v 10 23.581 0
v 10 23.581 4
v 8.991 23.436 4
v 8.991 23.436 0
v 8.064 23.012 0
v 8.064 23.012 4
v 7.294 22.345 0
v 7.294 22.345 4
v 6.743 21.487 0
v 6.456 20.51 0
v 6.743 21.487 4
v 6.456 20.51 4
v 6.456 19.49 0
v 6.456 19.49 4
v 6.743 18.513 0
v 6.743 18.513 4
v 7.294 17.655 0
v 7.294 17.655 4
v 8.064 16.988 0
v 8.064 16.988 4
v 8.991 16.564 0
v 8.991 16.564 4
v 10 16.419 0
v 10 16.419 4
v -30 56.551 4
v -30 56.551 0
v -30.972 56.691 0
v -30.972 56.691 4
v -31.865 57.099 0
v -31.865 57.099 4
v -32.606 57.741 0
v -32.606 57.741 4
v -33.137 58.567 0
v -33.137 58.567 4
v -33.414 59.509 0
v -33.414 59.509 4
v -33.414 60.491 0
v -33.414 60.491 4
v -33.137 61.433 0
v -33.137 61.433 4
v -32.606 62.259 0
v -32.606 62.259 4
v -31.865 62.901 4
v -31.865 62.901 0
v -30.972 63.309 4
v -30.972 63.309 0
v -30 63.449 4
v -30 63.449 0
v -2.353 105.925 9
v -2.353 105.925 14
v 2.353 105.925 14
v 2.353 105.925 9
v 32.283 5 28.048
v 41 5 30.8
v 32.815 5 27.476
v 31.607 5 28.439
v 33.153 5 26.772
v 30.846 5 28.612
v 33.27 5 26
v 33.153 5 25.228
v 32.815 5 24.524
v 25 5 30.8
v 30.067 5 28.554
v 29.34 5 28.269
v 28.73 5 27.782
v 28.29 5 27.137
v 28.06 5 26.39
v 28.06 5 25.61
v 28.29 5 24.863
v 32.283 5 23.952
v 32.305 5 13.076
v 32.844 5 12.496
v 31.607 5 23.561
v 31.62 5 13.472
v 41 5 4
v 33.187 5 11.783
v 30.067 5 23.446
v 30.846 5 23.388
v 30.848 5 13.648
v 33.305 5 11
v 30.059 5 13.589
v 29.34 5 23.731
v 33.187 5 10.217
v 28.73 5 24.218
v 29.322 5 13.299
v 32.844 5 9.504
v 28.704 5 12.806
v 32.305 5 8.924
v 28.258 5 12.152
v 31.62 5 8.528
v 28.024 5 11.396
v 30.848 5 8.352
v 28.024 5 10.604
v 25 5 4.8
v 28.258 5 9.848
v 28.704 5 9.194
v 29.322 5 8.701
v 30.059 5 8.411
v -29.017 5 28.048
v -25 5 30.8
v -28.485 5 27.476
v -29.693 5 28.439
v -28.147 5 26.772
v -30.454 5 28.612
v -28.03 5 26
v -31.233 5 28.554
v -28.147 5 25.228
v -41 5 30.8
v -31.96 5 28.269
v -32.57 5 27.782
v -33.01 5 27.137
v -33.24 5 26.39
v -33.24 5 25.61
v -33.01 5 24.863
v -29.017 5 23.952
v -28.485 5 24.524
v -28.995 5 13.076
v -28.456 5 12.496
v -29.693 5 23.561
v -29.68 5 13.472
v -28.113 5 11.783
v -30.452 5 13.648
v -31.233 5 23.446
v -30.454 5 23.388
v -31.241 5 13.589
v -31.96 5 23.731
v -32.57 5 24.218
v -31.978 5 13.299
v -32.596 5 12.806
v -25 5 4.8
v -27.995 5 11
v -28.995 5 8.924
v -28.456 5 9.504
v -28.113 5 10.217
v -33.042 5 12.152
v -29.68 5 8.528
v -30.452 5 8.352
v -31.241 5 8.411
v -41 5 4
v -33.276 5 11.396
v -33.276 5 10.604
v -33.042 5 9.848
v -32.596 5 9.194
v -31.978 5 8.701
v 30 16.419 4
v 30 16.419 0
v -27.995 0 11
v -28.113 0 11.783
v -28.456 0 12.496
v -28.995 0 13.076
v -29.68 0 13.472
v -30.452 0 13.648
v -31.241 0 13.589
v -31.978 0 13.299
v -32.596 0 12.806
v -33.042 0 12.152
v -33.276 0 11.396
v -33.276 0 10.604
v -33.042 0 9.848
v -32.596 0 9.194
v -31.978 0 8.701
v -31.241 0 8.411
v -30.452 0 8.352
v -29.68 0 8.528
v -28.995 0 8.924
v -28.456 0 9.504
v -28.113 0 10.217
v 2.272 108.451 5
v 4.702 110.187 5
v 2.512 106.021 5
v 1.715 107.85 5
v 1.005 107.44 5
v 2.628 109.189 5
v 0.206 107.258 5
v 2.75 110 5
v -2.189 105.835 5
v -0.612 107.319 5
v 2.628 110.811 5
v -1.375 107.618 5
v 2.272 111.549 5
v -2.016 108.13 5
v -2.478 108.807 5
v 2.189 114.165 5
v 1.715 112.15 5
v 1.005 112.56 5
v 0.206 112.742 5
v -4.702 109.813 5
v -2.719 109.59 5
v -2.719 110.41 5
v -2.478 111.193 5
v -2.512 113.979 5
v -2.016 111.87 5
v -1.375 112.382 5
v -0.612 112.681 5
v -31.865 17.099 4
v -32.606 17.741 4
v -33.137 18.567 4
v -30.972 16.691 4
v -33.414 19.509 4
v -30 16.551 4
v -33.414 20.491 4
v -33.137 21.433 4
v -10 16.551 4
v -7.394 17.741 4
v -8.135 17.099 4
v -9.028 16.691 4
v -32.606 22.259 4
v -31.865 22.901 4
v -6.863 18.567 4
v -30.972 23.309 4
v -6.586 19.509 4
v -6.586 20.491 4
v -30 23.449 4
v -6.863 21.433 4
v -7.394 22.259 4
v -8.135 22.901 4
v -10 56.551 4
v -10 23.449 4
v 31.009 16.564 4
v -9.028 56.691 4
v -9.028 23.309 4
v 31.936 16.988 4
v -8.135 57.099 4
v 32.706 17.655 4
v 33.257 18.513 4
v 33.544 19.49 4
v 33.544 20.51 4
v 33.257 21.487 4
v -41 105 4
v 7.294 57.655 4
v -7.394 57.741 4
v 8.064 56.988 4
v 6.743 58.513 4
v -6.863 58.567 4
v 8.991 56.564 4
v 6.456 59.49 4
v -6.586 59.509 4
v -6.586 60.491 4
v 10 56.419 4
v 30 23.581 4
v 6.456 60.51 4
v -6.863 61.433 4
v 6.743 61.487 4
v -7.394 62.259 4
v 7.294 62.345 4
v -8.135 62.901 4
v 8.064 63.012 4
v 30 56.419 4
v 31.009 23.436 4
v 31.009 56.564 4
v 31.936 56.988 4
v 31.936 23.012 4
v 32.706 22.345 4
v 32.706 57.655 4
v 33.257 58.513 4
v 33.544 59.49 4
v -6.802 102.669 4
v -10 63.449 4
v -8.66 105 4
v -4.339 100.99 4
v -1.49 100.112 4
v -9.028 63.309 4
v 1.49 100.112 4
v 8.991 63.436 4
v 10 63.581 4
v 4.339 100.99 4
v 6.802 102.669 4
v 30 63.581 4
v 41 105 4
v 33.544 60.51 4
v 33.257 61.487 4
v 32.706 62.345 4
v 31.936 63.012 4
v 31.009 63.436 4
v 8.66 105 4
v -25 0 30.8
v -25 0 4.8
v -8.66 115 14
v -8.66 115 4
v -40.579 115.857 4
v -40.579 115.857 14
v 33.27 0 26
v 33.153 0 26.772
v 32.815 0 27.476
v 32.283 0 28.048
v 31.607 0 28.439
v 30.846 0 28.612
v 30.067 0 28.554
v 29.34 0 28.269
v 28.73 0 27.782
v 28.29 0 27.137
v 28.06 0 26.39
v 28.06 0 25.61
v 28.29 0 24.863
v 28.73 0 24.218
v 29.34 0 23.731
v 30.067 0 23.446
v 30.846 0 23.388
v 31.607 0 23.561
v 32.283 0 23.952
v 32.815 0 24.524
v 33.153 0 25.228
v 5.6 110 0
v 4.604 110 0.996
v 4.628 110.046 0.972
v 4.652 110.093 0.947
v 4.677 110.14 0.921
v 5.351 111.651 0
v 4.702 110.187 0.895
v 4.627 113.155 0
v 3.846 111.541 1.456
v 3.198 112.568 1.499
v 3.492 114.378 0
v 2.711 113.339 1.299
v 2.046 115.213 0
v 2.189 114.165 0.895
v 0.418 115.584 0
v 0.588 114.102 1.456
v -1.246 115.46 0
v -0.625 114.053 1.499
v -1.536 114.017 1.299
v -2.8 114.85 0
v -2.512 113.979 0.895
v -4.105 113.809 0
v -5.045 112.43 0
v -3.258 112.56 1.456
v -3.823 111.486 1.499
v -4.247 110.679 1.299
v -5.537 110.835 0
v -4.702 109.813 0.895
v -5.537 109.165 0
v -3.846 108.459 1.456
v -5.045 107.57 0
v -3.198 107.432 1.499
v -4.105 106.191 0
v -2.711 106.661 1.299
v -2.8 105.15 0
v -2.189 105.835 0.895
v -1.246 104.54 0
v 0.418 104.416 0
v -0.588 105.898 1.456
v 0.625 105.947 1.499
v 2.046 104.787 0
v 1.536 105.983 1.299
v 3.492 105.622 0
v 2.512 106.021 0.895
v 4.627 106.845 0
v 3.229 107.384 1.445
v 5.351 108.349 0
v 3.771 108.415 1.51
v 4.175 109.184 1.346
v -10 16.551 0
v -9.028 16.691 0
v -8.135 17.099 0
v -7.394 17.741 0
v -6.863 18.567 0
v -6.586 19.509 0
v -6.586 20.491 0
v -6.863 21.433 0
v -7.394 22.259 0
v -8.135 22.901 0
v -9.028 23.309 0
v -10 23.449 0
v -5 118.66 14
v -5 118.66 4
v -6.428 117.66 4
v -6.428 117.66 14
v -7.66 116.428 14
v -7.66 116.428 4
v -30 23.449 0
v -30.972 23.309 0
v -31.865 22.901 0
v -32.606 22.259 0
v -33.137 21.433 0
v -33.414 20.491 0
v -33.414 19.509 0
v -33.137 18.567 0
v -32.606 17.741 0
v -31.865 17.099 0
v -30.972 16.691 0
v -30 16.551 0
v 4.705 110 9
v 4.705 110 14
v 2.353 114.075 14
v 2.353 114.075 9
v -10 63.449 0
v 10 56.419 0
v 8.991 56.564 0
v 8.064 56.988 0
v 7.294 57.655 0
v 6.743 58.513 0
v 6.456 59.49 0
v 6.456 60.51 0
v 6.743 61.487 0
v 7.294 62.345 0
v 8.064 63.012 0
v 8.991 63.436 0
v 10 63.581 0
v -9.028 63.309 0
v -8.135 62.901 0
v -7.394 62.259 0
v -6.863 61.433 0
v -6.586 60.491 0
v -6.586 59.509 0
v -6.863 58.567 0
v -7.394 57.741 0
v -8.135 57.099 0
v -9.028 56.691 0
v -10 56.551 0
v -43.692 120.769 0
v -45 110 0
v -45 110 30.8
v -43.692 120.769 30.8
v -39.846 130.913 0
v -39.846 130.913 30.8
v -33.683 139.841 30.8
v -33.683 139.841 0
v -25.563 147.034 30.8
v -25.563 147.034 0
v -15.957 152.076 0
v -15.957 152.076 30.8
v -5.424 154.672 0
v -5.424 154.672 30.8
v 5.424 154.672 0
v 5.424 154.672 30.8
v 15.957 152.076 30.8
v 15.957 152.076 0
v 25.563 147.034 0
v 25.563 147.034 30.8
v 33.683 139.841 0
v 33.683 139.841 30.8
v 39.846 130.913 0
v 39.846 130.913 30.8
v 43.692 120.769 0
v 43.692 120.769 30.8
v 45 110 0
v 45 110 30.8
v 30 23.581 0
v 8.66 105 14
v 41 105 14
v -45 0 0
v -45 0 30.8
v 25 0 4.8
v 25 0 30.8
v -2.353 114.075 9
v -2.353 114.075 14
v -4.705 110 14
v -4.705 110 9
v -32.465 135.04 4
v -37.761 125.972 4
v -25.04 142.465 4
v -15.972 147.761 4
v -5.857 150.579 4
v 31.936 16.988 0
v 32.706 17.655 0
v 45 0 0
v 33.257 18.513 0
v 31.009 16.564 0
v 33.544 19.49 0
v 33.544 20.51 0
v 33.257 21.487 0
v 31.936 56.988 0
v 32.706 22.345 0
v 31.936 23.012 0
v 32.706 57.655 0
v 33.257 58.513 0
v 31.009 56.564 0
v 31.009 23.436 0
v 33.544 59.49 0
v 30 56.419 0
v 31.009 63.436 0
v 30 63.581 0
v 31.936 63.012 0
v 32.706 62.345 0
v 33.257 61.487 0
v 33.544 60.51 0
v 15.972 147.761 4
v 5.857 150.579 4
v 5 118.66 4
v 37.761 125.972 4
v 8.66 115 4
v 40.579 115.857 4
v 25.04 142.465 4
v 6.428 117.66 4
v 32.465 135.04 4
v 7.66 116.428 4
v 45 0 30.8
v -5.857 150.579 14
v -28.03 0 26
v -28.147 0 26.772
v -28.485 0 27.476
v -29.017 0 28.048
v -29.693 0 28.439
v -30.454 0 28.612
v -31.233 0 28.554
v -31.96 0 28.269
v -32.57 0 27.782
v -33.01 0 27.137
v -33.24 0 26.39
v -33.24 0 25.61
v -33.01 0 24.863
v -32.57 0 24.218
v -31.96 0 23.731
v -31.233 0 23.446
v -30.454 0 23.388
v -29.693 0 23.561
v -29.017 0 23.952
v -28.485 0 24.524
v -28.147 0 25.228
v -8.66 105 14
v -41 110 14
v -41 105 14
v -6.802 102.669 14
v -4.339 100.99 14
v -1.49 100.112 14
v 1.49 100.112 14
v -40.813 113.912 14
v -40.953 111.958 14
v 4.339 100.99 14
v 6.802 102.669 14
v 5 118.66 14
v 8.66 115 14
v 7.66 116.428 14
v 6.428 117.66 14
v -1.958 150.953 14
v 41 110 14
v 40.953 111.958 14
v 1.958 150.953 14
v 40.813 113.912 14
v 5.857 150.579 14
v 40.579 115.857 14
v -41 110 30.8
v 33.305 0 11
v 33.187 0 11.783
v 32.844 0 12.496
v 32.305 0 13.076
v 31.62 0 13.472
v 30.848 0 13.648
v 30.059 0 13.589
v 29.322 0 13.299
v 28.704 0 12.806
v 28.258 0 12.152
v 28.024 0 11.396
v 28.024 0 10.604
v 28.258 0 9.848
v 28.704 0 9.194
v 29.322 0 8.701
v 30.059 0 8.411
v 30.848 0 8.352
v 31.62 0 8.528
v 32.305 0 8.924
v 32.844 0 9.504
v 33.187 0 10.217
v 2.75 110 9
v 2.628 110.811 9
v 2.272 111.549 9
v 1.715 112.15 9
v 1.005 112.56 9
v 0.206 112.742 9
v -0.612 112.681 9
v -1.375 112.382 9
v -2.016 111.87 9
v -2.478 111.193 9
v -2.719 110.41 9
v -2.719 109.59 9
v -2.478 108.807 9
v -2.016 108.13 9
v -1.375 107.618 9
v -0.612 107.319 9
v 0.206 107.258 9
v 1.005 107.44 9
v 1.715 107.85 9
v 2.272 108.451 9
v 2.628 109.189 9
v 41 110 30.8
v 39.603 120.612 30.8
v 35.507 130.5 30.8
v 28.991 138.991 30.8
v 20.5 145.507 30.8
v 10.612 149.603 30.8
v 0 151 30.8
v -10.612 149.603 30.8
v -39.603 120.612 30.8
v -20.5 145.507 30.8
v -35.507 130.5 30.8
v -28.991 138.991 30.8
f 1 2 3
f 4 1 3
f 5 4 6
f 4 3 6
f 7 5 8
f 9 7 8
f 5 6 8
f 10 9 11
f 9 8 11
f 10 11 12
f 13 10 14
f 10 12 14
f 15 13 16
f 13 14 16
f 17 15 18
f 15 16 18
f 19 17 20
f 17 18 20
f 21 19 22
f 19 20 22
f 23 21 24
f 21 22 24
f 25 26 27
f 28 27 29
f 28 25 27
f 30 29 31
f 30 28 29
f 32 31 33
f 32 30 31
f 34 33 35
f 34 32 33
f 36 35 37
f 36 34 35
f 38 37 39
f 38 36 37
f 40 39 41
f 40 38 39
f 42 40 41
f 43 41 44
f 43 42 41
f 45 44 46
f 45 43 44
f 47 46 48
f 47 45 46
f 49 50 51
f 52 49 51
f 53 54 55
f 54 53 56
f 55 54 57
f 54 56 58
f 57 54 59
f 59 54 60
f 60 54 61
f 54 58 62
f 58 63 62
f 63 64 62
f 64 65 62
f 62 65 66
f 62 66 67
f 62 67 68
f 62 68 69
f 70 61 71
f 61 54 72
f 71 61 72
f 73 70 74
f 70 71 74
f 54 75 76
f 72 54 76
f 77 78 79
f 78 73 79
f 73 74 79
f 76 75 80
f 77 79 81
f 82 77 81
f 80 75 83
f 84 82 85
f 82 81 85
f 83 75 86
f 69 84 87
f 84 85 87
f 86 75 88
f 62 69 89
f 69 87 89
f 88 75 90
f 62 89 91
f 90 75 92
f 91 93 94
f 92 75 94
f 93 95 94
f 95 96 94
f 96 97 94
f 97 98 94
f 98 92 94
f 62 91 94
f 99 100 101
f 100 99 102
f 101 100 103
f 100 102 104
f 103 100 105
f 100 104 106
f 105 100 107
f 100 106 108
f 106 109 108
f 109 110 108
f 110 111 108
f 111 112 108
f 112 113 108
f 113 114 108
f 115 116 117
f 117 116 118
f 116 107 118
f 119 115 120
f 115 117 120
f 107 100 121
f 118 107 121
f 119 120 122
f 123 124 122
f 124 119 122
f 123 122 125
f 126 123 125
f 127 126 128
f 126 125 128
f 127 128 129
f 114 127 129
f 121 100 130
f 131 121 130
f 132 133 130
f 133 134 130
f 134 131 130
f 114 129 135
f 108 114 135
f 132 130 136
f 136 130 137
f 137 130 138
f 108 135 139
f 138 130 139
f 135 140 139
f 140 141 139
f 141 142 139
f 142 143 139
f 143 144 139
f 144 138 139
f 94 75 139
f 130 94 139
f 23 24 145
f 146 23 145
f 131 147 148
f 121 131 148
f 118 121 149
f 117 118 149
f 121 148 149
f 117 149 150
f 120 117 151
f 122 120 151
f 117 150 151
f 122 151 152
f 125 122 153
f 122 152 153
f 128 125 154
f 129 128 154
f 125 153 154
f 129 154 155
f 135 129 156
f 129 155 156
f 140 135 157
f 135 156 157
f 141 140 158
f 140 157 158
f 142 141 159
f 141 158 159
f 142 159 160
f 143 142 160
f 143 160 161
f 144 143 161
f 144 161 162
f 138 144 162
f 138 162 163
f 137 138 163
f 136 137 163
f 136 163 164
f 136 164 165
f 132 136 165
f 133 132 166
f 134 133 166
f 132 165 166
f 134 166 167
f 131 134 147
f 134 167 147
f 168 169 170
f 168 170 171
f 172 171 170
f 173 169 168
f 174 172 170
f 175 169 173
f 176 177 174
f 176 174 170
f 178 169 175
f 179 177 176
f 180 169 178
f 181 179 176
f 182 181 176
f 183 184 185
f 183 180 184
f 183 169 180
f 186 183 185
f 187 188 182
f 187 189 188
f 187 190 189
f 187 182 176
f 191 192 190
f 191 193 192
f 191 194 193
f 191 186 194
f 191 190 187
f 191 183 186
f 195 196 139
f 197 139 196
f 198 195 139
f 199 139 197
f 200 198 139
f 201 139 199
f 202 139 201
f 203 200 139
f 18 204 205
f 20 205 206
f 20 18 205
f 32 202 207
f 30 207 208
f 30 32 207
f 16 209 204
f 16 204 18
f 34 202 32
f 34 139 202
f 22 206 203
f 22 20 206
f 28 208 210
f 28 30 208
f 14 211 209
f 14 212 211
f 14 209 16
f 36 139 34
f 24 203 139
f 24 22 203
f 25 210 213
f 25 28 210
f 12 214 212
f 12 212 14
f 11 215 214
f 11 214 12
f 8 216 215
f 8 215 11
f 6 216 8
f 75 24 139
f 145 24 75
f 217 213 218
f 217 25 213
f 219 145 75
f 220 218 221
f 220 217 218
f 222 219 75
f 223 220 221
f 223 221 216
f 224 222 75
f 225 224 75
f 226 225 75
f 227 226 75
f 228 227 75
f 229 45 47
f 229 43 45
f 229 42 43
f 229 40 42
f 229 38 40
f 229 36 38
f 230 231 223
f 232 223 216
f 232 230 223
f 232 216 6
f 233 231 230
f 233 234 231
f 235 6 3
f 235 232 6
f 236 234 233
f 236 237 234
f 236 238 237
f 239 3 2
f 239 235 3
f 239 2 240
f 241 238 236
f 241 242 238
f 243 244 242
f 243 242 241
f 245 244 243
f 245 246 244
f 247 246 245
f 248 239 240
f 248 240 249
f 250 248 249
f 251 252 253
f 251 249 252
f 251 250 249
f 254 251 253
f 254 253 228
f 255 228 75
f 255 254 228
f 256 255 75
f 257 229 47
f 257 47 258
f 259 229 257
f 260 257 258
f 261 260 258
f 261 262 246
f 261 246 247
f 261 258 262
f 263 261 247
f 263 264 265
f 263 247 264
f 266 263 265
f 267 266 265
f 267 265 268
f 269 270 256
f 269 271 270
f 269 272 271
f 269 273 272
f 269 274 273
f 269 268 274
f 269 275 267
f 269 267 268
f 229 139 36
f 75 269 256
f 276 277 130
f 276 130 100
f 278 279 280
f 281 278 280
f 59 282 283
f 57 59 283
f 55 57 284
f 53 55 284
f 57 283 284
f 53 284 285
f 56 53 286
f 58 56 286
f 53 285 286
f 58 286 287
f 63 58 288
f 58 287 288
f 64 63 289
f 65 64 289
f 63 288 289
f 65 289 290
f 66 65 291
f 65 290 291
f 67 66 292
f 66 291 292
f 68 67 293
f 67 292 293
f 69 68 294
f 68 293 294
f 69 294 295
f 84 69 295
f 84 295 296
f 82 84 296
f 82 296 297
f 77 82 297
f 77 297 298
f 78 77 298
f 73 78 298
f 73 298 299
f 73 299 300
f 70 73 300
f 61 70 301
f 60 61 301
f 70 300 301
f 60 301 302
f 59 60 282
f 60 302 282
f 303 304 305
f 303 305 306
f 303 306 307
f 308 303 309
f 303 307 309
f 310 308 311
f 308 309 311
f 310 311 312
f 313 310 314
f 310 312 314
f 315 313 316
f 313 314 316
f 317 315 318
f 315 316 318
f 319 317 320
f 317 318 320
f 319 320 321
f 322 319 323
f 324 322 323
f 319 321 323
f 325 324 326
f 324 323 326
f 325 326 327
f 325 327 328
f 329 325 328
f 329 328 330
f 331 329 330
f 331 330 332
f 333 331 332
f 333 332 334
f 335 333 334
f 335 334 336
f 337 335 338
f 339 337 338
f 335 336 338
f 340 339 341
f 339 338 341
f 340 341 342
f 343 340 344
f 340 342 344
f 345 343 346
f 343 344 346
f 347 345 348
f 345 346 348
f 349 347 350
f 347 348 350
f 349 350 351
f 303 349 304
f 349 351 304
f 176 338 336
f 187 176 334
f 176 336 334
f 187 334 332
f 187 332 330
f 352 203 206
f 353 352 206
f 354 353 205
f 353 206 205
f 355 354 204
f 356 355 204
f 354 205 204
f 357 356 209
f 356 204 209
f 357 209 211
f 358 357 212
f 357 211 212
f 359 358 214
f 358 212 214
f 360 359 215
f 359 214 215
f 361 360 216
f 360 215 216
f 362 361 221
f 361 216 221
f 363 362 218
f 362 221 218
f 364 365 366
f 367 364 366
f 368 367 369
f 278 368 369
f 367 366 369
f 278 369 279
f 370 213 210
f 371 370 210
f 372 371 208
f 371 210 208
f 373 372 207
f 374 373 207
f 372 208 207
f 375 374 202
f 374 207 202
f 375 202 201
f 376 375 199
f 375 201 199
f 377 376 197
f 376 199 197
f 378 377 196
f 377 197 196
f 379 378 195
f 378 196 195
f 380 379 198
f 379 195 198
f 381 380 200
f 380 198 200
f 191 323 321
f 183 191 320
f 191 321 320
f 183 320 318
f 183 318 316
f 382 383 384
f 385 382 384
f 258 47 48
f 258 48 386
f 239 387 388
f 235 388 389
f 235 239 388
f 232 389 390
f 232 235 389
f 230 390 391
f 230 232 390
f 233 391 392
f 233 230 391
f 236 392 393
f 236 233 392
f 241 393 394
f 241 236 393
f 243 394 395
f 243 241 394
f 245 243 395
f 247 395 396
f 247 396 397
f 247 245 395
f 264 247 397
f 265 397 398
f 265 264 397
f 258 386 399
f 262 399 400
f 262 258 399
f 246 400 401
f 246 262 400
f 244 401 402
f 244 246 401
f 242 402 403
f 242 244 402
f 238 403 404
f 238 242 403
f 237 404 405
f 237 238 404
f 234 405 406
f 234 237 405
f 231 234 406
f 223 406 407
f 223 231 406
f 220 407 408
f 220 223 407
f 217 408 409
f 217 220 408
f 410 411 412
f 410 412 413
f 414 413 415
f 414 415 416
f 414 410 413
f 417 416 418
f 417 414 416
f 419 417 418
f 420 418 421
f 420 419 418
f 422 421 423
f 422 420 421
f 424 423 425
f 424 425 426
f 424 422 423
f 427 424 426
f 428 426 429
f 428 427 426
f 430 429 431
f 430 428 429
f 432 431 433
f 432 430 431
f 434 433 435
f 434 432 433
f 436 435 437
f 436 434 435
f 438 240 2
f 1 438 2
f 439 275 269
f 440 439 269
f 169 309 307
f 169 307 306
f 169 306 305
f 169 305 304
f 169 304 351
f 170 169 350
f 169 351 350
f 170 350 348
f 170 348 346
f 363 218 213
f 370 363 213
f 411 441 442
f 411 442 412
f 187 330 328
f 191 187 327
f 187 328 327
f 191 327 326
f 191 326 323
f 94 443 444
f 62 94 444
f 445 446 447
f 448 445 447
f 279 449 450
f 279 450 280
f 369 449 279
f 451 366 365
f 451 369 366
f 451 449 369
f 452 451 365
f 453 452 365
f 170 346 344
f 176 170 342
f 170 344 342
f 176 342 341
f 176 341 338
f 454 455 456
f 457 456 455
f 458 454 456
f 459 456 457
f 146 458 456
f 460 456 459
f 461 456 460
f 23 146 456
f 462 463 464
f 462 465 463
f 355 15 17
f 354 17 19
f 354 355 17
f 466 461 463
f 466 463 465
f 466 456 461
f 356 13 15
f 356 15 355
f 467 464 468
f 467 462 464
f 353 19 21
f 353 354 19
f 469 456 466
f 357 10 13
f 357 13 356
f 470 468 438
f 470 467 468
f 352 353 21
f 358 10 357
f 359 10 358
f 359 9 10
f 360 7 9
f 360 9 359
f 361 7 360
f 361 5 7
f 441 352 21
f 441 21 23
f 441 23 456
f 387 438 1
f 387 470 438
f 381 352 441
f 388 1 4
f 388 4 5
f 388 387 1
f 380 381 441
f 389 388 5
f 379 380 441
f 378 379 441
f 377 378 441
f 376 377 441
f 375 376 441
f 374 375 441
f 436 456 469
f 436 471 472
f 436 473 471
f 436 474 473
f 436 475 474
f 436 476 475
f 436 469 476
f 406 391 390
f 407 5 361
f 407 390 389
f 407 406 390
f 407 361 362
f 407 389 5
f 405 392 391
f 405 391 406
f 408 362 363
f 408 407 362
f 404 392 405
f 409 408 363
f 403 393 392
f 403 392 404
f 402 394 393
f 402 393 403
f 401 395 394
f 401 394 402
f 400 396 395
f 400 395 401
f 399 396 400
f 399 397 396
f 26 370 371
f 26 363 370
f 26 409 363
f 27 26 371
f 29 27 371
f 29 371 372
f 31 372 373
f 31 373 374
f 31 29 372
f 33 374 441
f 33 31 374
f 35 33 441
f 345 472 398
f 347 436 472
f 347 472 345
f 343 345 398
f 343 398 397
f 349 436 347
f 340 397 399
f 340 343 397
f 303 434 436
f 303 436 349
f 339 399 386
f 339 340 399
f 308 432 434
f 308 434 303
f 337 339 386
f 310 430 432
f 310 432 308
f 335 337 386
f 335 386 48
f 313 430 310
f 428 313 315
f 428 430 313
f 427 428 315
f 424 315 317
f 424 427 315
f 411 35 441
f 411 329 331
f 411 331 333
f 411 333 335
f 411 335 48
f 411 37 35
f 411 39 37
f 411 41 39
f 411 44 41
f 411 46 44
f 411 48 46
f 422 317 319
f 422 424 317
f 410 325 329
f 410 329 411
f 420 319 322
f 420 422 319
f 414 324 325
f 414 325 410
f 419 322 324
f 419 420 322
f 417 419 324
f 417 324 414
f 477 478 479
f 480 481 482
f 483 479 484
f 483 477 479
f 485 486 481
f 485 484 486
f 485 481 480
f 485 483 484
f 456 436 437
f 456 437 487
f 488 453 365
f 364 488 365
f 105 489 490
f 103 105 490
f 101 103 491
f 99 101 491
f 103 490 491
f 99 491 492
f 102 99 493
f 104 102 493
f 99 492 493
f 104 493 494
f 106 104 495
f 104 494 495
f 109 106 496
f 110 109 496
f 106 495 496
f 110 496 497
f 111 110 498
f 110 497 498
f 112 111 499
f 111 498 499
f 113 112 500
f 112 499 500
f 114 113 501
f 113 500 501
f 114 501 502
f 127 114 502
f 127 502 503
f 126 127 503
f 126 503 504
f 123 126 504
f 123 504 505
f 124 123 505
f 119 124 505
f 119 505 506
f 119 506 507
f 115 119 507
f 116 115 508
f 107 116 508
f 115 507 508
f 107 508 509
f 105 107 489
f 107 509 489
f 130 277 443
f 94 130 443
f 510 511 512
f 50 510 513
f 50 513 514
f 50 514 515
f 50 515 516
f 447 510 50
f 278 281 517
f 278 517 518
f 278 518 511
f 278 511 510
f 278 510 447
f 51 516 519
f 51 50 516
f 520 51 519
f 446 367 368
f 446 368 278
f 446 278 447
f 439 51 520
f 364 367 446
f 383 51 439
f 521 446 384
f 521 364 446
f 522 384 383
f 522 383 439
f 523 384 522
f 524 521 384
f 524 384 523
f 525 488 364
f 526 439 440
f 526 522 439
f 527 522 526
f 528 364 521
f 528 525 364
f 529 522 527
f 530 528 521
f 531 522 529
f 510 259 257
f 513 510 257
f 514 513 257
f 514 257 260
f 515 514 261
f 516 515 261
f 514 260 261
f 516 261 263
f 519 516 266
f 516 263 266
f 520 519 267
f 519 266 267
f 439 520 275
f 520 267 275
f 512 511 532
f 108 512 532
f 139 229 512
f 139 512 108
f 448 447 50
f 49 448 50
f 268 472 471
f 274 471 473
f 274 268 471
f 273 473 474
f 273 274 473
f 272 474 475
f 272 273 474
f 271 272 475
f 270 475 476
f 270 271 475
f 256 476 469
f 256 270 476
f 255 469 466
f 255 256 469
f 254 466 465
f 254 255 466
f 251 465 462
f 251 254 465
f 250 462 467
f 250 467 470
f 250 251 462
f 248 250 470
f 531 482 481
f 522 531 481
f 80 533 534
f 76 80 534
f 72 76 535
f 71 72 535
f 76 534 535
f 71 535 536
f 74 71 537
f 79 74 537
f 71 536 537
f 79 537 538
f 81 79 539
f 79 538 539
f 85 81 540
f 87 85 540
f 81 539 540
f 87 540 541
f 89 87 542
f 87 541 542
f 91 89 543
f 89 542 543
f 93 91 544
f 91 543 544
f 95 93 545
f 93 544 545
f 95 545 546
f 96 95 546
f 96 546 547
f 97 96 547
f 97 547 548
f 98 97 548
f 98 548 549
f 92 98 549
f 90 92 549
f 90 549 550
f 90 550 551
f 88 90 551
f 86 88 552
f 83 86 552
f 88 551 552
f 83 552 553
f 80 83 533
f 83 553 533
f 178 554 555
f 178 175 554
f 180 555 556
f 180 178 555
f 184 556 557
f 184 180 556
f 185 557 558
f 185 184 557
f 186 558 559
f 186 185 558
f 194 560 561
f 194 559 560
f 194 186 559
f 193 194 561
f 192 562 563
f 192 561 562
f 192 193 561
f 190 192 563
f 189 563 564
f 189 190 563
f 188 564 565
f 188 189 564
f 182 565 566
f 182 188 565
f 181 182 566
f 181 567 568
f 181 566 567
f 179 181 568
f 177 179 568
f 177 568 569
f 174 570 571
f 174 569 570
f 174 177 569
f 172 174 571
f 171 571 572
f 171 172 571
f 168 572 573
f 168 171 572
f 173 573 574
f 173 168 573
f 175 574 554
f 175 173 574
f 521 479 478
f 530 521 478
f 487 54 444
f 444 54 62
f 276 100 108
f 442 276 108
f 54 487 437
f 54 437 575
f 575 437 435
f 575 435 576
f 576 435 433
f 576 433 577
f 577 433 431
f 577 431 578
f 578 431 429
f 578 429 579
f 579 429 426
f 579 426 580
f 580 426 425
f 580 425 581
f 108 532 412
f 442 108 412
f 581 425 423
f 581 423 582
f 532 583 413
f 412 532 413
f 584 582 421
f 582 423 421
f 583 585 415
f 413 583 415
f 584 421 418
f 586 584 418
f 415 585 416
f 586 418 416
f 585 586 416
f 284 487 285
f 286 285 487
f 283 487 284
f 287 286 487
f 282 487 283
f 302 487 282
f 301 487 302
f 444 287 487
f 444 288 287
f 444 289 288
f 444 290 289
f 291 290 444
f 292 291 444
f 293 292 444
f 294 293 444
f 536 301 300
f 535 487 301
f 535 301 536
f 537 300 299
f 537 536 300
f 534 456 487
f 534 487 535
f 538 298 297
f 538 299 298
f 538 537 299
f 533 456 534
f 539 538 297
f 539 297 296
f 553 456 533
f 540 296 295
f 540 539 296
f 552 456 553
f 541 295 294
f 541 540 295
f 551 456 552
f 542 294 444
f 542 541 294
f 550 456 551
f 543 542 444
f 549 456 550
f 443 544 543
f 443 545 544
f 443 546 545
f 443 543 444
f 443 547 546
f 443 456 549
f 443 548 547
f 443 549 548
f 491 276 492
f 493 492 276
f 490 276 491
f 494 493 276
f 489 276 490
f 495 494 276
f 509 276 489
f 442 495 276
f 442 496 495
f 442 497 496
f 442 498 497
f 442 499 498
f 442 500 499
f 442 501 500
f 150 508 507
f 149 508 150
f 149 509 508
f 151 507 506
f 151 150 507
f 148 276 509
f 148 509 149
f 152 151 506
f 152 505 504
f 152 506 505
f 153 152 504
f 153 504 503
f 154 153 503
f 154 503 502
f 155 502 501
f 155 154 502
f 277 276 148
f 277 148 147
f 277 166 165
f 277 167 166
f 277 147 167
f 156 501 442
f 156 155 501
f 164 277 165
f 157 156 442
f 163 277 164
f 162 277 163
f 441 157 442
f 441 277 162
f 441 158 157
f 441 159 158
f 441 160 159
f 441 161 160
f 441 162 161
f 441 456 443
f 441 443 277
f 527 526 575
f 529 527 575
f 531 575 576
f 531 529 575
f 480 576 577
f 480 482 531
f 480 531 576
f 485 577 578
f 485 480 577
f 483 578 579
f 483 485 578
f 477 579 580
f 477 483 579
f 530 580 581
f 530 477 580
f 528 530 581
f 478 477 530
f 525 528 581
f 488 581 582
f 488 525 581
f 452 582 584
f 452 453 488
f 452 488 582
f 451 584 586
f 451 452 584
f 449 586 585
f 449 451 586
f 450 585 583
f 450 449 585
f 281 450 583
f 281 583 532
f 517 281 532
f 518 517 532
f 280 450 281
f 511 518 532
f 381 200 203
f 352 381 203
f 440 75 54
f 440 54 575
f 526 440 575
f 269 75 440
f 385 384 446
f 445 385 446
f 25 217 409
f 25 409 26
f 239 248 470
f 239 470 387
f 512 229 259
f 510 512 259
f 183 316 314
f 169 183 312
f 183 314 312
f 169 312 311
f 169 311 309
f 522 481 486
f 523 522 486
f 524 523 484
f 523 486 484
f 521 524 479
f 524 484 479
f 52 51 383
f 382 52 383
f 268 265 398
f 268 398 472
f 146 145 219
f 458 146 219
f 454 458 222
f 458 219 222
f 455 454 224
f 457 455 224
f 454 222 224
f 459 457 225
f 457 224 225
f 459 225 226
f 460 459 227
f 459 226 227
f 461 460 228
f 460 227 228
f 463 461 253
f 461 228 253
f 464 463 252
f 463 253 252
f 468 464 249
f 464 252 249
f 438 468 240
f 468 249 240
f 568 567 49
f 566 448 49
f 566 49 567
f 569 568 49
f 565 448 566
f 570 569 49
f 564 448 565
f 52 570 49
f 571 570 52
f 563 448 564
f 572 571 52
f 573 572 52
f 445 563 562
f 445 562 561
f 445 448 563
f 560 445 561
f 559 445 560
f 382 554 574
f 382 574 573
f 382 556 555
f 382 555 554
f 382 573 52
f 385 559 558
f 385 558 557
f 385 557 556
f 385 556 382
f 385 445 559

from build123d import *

# Parameters (mm, degrees)
SALIENTE_EXTRUIR1_DEPTH                              = 4
CROQUIS2_R                                           = 2.75
SALIENTE_EXTRUIR2_DEPTH                              = 10
SALIENTE_EXTRUIR3_DEPTH                              = 30.8
CROQUIS4_R                                           = 2.75
CORTAR_EXTRUIR1_DEPTH                                = 4
REFRENTADO_PARA_TORNILLO_TAP_N_CON_CABEZ_D           = 5.5
REFRENTADO_PARA_TORNILLO_TAP_N_CON_CABEZ_CSINK_D     = 11.2
REFRENTADO_PARA_TORNILLO_TAP_N_CON_CABEZ_CSINK_ANGLE = 90
CORTAR_EXTRUIR2_DEPTH                                = 5
CORTAR_EXTRUIR3_DEPTH                                = 5
CORTAR_EXTRUIR4_DEPTH                                = 14
CROQUIS10_W                                          = 82
CROQUIS10_H                                          = 26.8
SALIENTE_EXTRUIR4_DEPTH                              = 5
CROQUIS11_R                                          = 2.619714774
CROQUIS11_W                                          = 50
CROQUIS11_H                                          = 26
CROQUIS11_R_2                                        = 2.655214408
CORTAR_EXTRUIR5_DEPTH                                = 5


with BuildPart() as part:
    # Croquis1 → Saliente-Extruir1 (new body)
    with BuildSketch(Plane.XY):
        with BuildLine():
            Line((-41, 0), (41, 0))
            Line((41, 0), (41, 110))
            ThreePointArc((41, 110), (0, 151), (-41, 110))
            Line((-41, 110), (-41, 0))
        make_face()
    extrude(amount=SALIENTE_EXTRUIR1_DEPTH)

    # Croquis2 → Saliente-Extruir2 (add)
    with BuildSketch(Plane.XY.offset(4)):
        with BuildLine():
            Line((-41, 105), (-8.660254038, 105))
            ThreePointArc((-8.660254038, 105), (0, 100), (8.660254038, 105))
            Line((8.660254038, 105), (41, 105))
            Line((41, 105), (41, 110))
            ThreePointArc((41, 110), (40.894733882, 112.936109791), (40.579476063, 115.857142857))
            Line((40.579476063, 115.857142857), (8.660254038, 115))
            ThreePointArc((8.660254038, 115), (7.071067812, 117.071067812), (5, 118.660254038))
            Line((5, 118.660254038), (5.857142857, 150.579476063))
            ThreePointArc((5.857142857, 150.579476063), (0, 151), (-5.857142857, 150.579476063))
            Line((-5.857142857, 150.579476063), (-5, 118.660254038))
            ThreePointArc((-5, 118.660254038), (-7.071067812, 117.071067812), (-8.660254038, 115))
            Line((-8.660254038, 115), (-40.579476063, 115.857142857))
            ThreePointArc((-40.579476063, 115.857142857), (-40.894733882, 112.936109791), (-41, 110))
            Line((-41, 110), (-41, 105))
        make_face()
        with Locations((0, 110)):
            Circle(CROQUIS2_R, mode=Mode.SUBTRACT)
    extrude(amount=SALIENTE_EXTRUIR2_DEPTH)

    # Croquis3 → Saliente-Extruir3 (add)
    with BuildSketch(Plane(origin=(0, 0, 0), x_dir=(-1, 0, 0), z_dir=(0, 0, -1))):
        with BuildLine():
            Line((-41, 0), (-41, 110))
            ThreePointArc((-41, 110), (0, 151), (41, 110))
            Line((41, 110), (41, 0))
            Line((41, 0), (45, 0))
            Line((45, 0), (45, 110))
            ThreePointArc((45, 110), (0, 155), (-45, 110))
            Line((-45, 110), (-45, 0))
            Line((-45, 0), (-41, 0))
        make_face()
    extrude(amount=-SALIENTE_EXTRUIR3_DEPTH)

    # Croquis4 → Cortar-Extruir1 (cut)
    with BuildSketch(Plane.XY.offset(4)):
        with Locations((0, 110)):
            Circle(CROQUIS4_R)
    extrude(amount=-CORTAR_EXTRUIR1_DEPTH, mode=Mode.SUBTRACT)

    # Refrentado para tornillo tapón con cabeza plana de clavija de M52 (through all)
    with Locations(Plane(origin=(0, 110, 0), x_dir=(-1, 0, 0), z_dir=(0, 0, -1))):
        with Locations((0, 0)):
            CounterSinkHole(REFRENTADO_PARA_TORNILLO_TAP_N_CON_CABEZ_D / 2, REFRENTADO_PARA_TORNILLO_TAP_N_CON_CABEZ_CSINK_D / 2, counter_sink_angle=REFRENTADO_PARA_TORNILLO_TAP_N_CON_CABEZ_CSINK_ANGLE)

    # Croquis7 → Cortar-Extruir2 (cut)
    with BuildSketch(Plane(origin=(0, 0, 0), x_dir=(-1, 0, 0), z_dir=(0, 0, -1))):
        Polygon((2.189291013, 105.834926388), (4.701705063, 109.813444827), (2.512414051, 113.978518439), (-2.189291013, 114.165073612), (-4.701705063, 110.186555173), (-2.512414051, 106.021481561), align=None)
    extrude(amount=-CORTAR_EXTRUIR2_DEPTH, mode=Mode.SUBTRACT)

    # Croquis8 → Cortar-Extruir3 (cut)
    with BuildSketch(Plane.XY.offset(14)):
        Polygon((4.705404694, 110), (2.352702347, 114.075), (-2.352702347, 114.075), (-4.705404694, 110), (-2.352702347, 105.925), (2.352702347, 105.925), align=None)
    extrude(amount=-CORTAR_EXTRUIR3_DEPTH, mode=Mode.SUBTRACT)

    # Croquis9 → Cortar-Extruir4 (cut)
    with BuildSketch(Plane.XY.offset(14)):
        with BuildLine():
            Line((-30, 63.448836188), (-10, 63.448836188))
            ThreePointArc((-10, 63.448836188), (-6.551163812, 60), (-10, 56.551163812))
            Line((-10, 56.551163812), (-30, 56.551163812))
            ThreePointArc((-30, 56.551163812), (-33.448836188, 60), (-30, 63.448836188))
        make_face()
        with BuildLine():
            Line((10, 63.580626855), (30, 63.580626855))
            ThreePointArc((30, 63.580626855), (33.580626855, 60), (30, 56.419373145))
            Line((30, 56.419373145), (10, 56.419373145))
            ThreePointArc((10, 56.419373145), (6.419373145, 60), (10, 63.580626855))
        make_face()
        with BuildLine():
            Line((-30, 16.551163812), (-10, 16.551163812))
            ThreePointArc((-10, 16.551163812), (-6.551163812, 20), (-10, 23.448836188))
            Line((-10, 23.448836188), (-30, 23.448836188))
            ThreePointArc((-30, 23.448836188), (-33.448836188, 20), (-30, 16.551163812))
        make_face()
        with BuildLine():
            Line((10, 16.419373145), (30, 16.419373145))
            ThreePointArc((30, 16.419373145), (33.580626855, 20), (30, 23.580626855))
            Line((30, 23.580626855), (10, 23.580626855))
            ThreePointArc((10, 23.580626855), (6.419373145, 20), (10, 16.419373145))
        make_face()
    extrude(amount=-CORTAR_EXTRUIR4_DEPTH, mode=Mode.SUBTRACT)

    # Croquis10 → Saliente-Extruir4 (add)
    with BuildSketch(Plane(origin=(0, 5, 0), x_dir=(-1, 0, 0), z_dir=(0, -1, 0))):
        with Locations((0, -17.4)):
            Rectangle(CROQUIS10_W, CROQUIS10_H)
    extrude(amount=SALIENTE_EXTRUIR4_DEPTH)

    # Croquis11 → Cortar-Extruir5 (cut)
    with BuildSketch(Plane.XZ):
        with Locations((-30.65, 26)):
            Circle(CROQUIS11_R)
        with Locations((0, 17.8)):
            Rectangle(CROQUIS11_W, CROQUIS11_H)
        with Locations((30.65, 26)):
            Circle(CROQUIS11_R)
        with Locations((30.65, 11)):
            Circle(CROQUIS11_R_2)
        with Locations((-30.65, 11)):
            Circle(CROQUIS11_R_2)
    extrude(amount=-CORTAR_EXTRUIR5_DEPTH, mode=Mode.SUBTRACT)


solid = part.part
